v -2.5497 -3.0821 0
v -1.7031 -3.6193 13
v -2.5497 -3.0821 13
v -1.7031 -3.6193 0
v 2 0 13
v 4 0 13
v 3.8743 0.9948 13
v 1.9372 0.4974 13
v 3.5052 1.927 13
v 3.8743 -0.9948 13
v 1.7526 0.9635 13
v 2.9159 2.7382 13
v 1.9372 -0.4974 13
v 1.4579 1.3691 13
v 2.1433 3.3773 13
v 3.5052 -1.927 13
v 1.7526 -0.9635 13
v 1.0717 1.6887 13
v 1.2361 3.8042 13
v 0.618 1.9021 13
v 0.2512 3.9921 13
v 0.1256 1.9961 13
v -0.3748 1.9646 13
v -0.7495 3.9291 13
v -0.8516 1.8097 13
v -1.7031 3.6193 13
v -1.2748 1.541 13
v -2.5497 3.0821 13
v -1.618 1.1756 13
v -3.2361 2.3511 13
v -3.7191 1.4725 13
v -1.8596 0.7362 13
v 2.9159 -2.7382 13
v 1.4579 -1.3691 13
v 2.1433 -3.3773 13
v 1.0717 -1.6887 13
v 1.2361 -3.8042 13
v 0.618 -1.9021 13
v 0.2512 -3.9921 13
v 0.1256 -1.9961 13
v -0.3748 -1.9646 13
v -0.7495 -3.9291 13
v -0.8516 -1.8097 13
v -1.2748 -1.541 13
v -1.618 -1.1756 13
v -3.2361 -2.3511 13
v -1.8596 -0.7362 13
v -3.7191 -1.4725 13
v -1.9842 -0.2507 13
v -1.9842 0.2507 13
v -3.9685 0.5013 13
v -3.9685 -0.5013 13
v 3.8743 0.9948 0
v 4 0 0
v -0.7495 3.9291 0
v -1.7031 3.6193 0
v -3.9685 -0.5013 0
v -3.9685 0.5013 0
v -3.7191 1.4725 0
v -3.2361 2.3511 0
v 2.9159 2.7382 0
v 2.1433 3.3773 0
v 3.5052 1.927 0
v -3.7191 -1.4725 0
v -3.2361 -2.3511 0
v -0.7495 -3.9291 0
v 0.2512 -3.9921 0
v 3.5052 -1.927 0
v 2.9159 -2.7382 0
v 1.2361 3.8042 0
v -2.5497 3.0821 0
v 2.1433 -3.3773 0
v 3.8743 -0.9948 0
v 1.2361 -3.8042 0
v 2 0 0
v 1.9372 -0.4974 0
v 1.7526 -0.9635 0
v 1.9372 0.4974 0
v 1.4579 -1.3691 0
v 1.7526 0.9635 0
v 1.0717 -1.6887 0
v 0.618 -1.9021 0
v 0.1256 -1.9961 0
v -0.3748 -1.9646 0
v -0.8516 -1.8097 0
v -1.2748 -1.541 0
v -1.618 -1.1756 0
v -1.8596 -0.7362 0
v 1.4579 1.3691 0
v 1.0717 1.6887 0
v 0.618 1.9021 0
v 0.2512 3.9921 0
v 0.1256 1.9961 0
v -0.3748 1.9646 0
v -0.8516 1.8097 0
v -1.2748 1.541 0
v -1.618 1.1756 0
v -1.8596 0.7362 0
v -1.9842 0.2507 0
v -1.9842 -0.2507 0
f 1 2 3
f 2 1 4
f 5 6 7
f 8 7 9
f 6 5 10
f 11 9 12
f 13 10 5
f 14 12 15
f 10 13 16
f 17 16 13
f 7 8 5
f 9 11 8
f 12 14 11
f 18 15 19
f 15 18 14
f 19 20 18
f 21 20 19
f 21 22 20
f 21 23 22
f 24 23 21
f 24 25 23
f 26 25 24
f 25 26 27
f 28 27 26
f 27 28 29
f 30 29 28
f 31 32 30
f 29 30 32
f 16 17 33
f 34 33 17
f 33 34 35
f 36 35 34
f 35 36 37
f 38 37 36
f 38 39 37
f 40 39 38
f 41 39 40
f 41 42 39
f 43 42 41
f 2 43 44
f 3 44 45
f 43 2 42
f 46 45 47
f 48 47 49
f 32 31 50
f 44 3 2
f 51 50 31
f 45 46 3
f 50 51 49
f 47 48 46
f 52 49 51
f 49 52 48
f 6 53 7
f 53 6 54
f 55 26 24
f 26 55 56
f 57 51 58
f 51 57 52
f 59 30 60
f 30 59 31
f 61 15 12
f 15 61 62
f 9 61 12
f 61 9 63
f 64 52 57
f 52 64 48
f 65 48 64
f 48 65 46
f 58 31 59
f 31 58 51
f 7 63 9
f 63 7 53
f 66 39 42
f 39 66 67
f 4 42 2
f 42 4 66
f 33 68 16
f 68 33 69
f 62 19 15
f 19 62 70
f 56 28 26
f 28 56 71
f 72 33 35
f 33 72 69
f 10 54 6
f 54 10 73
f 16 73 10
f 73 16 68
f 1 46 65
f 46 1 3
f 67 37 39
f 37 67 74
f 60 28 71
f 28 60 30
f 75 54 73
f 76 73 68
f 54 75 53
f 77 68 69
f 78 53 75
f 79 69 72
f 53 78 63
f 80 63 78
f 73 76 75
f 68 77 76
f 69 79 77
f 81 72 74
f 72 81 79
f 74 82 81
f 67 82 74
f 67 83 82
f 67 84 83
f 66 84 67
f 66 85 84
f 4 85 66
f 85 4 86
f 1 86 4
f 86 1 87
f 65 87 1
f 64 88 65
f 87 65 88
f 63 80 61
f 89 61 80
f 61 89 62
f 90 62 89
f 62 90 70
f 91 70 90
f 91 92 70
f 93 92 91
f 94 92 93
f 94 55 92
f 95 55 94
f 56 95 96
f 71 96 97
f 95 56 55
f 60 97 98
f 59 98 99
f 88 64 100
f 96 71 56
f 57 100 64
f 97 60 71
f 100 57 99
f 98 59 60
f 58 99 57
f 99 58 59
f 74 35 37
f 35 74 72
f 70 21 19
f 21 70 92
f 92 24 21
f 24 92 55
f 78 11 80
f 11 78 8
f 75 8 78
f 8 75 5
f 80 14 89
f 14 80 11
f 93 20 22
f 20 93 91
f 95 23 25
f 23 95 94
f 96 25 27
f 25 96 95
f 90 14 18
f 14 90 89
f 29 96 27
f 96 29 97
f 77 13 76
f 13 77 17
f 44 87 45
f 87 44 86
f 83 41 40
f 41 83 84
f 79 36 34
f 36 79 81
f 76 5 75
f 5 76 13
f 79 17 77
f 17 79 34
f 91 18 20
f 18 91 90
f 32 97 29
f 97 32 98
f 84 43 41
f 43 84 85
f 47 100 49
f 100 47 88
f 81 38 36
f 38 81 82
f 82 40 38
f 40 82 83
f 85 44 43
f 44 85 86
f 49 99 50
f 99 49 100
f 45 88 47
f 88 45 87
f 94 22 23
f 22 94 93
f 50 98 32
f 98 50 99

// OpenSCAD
$fn = 25;

width_in_inches = 3;
length_in_inches = 3;

height = 4.7625; // 3/16"
hole_diameter = 6;

accessory_hole_diameter = 4;
accessory_hole_inset_diameter = 8;
accessory_hole_inset_height = 3;

spacer_height = 13;
spacer_diameter = 8;


MM_PER_INCH = 25.4;
width = width_in_inches * MM_PER_INCH;
length = length_in_inches * MM_PER_INCH;

//board();
//spacer();
screw_spacer();


module board() {
    difference() {
        cube([width, length, height]);
      
        holes();
        accessory_holes();
    }
}

module holes() {
    for (row = [1 : 1 : width_in_inches]) {
        for (col = [1 : 1 : length_in_inches]) {
            translate([row * MM_PER_INCH - MM_PER_INCH/2, col * MM_PER_INCH - MM_PER_INCH/2, height / 2])
                cylinder(h = height, d = hole_diameter, center = true);
        }
    }
}

module accessory_holes() {
    for (row = [1 : 1 : width_in_inches - 1]) {
        for (col = [1 : 1 : length_in_inches - 1]) {
            translate([row * MM_PER_INCH, col * MM_PER_INCH, height / 2])
                cylinder(h = height, d = accessory_hole_diameter, center = true);
            
            translate([row * MM_PER_INCH, col * MM_PER_INCH, height - (accessory_hole_inset_height / 2)])
                cylinder(h = accessory_hole_inset_height, d = accessory_hole_inset_diameter, center = true);
        }
    }
}

module spacer() {
    hole_length = height - accessory_hole_inset_height;
    horizontal_overlap = 1;
    
    // Spacer
    color("cyan")
        cylinder(h = spacer_height, d = spacer_diameter);
    
    // Latch
    translate([0, 0, spacer_height])
        difference() {
            union() {
                color("yellow")
                cylinder(h = hole_length, d = accessory_hole_diameter);
                
                translate([horizontal_overlap / 3, 0, hole_length + horizontal_overlap])
                    color("red")
                        sphere(d = accessory_hole_diameter);
                translate([-horizontal_overlap / 3, 0, hole_length + horizontal_overlap])
                    color("red")
                        sphere(d = accessory_hole_diameter);
            }
            
            translate([-horizontal_overlap / 2, -accessory_hole_diameter / 2, 0])
                cube([horizontal_overlap, accessory_hole_diameter, hole_length + accessory_hole_inset_height]);
        }
}

module screw_spacer() {
    hole_length = height - accessory_hole_inset_height;
    horizontal_overlap = 1;
    
    // Spacer
    color("cyan")
        difference() {
            cylinder(h = spacer_height, d = spacer_diameter);
            
            cylinder(h = spacer_height, d = accessory_hole_diameter);
        }
}
